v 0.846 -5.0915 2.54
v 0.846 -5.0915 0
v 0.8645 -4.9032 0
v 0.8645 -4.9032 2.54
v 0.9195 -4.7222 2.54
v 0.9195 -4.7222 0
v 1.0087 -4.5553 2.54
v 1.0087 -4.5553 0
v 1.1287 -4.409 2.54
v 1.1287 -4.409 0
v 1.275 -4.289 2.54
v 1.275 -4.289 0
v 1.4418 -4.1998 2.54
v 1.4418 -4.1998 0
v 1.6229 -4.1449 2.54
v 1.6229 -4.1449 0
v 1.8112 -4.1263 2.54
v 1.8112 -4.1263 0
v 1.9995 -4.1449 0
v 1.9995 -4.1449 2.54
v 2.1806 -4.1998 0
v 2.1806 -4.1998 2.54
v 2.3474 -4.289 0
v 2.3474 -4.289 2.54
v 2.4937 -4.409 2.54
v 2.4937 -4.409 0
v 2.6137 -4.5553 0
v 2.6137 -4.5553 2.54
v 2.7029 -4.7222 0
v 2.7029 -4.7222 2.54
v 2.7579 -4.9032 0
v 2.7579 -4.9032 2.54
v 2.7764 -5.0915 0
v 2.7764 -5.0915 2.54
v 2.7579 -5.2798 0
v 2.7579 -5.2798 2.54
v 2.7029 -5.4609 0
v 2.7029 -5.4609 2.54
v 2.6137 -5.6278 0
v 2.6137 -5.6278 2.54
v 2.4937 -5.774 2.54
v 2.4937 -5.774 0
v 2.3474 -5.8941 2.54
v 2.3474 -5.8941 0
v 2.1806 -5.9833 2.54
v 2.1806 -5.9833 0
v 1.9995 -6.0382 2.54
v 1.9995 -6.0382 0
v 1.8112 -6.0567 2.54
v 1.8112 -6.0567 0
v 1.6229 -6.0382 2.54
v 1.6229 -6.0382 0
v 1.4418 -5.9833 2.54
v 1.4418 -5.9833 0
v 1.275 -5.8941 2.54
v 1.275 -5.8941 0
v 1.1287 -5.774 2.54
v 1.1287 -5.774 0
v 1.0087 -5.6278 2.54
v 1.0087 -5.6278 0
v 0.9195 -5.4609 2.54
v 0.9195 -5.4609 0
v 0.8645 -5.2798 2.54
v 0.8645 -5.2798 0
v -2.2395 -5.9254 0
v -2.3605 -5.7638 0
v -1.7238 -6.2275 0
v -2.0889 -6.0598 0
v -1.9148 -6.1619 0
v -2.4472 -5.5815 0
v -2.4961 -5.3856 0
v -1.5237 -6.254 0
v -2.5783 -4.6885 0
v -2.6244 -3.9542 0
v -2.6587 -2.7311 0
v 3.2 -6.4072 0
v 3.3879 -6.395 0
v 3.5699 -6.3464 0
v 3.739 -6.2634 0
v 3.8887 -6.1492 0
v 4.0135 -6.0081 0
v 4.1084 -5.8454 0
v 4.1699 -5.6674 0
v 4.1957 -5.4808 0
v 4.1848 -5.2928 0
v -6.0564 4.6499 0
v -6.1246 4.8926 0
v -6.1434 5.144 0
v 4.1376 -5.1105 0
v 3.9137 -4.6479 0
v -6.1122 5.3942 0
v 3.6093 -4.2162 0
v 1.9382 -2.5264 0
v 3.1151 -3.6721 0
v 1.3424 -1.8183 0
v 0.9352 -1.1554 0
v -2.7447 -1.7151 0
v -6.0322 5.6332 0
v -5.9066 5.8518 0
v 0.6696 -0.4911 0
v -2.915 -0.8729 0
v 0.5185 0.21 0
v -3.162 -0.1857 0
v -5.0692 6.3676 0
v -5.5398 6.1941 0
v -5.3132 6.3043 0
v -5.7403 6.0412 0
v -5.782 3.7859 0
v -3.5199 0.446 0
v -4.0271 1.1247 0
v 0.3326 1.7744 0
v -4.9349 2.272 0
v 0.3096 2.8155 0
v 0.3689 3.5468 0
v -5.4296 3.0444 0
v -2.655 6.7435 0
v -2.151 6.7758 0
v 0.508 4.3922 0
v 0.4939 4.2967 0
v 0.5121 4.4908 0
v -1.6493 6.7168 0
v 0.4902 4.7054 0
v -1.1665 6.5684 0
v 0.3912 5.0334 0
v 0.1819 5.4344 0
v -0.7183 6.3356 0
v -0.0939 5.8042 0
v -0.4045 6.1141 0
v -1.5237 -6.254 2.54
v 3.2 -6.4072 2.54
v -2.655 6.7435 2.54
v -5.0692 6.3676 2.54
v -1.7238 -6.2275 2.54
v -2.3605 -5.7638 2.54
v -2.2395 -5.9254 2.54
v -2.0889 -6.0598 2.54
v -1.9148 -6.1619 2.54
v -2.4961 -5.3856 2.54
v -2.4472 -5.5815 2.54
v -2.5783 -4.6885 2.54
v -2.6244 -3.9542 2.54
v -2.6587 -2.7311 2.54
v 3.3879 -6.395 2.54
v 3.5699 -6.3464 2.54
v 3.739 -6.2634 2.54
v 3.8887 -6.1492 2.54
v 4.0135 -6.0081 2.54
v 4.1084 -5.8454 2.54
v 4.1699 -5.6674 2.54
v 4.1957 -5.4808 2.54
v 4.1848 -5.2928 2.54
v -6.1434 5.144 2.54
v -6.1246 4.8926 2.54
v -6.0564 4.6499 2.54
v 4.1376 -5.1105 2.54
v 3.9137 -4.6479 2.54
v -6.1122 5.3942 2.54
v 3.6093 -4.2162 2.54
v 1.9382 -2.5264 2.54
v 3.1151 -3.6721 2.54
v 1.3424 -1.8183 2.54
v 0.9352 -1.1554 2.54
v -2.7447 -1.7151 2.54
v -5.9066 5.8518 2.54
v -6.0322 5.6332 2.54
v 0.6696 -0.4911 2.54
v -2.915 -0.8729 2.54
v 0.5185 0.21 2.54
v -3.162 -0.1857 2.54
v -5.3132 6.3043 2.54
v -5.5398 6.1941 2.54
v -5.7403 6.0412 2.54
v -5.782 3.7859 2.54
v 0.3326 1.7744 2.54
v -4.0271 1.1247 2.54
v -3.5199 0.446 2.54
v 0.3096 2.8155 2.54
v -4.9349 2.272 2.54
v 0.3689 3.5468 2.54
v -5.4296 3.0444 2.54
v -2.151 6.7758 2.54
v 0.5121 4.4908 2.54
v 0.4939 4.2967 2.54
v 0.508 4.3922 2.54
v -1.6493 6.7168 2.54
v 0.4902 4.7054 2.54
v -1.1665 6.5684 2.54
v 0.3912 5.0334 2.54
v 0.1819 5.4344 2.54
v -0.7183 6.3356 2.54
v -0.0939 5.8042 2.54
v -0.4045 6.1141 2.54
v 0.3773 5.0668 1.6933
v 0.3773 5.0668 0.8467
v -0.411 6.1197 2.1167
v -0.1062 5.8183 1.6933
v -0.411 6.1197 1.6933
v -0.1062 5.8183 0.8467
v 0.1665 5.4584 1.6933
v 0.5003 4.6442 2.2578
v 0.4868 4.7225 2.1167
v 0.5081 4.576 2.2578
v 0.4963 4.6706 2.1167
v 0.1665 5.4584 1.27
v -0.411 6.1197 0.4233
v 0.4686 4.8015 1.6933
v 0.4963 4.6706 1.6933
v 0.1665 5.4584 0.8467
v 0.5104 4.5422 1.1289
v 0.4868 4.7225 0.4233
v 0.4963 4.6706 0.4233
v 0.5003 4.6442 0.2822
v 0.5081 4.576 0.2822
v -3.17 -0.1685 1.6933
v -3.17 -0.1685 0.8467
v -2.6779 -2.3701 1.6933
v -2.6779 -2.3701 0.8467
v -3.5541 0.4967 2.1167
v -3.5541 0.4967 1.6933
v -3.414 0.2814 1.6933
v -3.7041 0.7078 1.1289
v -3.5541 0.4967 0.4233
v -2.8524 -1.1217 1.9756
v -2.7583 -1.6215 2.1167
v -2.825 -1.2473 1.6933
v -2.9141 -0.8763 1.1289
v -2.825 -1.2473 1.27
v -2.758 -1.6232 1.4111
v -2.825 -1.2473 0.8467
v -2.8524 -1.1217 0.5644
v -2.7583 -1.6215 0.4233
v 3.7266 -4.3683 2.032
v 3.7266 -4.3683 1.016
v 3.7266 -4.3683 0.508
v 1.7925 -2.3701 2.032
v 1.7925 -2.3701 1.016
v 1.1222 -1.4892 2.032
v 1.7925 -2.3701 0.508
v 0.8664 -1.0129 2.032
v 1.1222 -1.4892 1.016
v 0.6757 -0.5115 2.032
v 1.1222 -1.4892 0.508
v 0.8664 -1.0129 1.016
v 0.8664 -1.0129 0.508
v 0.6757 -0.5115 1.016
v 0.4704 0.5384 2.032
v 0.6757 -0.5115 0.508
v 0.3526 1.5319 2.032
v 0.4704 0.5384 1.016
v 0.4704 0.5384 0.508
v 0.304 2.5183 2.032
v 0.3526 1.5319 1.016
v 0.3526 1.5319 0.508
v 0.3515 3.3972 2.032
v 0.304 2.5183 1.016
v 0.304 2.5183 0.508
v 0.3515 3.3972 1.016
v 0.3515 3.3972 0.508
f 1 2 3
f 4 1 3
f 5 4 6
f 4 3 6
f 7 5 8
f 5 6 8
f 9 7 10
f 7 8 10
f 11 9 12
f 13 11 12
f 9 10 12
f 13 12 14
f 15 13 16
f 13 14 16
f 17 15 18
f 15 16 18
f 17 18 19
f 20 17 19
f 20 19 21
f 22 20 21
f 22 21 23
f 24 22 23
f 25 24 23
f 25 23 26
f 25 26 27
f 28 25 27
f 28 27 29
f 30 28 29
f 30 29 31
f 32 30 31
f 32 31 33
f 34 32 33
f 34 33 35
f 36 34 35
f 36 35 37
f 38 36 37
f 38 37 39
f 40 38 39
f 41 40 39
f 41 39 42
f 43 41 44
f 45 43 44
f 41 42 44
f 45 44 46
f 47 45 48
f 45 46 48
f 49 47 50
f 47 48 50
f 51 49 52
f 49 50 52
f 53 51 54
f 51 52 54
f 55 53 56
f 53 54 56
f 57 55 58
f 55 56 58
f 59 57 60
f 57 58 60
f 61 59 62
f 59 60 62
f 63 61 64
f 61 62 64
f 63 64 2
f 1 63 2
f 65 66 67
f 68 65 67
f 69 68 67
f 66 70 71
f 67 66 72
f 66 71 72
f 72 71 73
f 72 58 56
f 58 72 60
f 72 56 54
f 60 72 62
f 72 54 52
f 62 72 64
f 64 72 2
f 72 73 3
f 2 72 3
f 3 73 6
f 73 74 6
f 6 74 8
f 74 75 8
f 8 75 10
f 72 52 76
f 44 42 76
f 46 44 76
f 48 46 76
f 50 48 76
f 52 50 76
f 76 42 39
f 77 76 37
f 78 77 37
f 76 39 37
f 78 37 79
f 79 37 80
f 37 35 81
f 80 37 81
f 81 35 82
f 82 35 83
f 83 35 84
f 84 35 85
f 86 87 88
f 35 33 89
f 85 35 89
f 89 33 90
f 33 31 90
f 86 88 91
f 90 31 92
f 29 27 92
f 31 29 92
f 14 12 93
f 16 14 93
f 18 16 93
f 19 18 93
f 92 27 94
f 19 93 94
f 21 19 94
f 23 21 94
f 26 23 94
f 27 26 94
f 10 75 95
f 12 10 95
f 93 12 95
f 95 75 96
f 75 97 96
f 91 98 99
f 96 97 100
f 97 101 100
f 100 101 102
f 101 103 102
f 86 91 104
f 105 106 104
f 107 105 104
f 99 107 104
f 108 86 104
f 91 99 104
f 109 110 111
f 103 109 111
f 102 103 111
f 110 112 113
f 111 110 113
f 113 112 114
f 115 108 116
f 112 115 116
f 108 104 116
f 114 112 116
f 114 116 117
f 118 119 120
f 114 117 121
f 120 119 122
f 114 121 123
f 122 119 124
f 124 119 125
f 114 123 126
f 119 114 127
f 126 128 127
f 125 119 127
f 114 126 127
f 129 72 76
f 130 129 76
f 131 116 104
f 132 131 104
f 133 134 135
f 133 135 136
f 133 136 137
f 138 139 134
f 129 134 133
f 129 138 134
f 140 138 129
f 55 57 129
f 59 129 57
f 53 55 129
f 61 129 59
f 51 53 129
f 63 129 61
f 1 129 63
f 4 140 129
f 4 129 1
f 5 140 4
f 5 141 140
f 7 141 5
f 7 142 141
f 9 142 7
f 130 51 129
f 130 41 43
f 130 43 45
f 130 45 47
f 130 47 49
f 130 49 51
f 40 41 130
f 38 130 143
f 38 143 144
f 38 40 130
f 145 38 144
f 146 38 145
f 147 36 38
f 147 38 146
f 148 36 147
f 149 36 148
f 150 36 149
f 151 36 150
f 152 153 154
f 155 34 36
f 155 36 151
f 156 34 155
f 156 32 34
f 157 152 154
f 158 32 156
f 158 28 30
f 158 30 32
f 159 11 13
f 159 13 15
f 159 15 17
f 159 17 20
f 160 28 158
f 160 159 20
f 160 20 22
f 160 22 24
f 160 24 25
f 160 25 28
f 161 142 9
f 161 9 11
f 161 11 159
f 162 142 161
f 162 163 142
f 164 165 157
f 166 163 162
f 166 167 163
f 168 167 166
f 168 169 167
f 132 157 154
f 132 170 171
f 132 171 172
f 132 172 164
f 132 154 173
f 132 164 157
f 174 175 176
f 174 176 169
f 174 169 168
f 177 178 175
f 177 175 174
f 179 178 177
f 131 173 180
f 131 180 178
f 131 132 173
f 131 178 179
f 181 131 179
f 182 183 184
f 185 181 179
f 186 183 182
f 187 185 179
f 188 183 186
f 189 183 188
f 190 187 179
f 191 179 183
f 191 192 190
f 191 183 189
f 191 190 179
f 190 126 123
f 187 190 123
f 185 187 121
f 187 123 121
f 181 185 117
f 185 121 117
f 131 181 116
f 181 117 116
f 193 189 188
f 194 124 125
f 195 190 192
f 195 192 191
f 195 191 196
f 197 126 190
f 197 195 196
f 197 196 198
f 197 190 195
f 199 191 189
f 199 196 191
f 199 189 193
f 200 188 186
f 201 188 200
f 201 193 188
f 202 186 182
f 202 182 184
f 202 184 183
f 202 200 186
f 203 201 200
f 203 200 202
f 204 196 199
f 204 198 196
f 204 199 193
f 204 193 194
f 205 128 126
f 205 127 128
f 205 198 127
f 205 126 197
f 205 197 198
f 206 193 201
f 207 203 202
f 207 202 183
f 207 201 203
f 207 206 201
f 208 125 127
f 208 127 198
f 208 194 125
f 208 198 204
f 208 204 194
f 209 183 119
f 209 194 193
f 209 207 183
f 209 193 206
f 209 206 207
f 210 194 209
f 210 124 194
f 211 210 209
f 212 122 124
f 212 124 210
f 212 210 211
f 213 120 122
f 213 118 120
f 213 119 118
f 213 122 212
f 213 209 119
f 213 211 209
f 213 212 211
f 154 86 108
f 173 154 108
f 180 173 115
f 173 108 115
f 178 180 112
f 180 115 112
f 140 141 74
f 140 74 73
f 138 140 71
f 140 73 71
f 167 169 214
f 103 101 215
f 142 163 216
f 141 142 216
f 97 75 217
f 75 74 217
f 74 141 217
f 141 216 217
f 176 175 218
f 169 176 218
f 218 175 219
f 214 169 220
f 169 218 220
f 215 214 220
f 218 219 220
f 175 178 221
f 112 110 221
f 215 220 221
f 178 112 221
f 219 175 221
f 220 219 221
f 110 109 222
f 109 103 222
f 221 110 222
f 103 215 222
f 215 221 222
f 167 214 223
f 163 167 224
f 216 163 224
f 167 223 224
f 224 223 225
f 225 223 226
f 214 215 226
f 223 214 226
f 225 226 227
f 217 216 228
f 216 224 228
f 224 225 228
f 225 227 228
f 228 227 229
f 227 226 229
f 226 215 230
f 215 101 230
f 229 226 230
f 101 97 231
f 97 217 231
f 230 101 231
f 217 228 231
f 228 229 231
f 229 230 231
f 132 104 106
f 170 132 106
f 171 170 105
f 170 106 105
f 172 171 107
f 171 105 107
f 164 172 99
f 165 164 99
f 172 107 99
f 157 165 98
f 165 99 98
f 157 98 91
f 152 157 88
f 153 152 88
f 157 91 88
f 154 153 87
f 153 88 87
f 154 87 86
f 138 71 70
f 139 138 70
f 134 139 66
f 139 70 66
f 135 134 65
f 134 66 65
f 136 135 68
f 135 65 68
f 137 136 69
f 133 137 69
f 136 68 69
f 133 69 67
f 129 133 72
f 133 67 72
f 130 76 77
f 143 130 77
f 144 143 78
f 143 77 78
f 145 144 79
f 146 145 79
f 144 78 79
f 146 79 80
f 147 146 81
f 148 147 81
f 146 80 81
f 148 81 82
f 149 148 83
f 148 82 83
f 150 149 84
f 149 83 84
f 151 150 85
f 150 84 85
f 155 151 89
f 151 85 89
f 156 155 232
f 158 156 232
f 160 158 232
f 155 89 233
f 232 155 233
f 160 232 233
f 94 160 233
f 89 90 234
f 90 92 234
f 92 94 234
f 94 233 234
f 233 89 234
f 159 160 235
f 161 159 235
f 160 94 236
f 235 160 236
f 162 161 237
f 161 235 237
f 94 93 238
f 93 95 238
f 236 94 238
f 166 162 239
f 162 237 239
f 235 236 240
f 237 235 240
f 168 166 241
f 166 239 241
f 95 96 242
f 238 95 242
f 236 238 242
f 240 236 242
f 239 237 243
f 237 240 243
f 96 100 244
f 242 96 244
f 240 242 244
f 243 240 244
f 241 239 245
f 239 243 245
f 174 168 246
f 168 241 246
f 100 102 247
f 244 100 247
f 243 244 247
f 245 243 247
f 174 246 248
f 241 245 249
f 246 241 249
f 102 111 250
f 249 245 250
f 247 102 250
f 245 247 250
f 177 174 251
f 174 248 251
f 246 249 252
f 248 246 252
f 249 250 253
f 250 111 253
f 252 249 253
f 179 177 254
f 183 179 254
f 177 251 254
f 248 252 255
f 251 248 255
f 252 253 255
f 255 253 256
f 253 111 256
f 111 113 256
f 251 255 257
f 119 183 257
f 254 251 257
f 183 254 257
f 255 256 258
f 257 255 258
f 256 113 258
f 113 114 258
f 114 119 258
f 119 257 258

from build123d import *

# Parameters (mm, degrees)
BOSS_EXTRUDE1_DEPTH         = 2.54
F_48_0_076_DIAMETER_HOLE1_D = 1.9304


with BuildPart() as part:
    # Sketch1 → Boss-Extrude1 (new body)
    with BuildSketch(Plane.XY):
        with BuildLine():
            Line((-1.523739013, -6.254008737), (3.199990263, -6.407247691))
            ThreePointArc((3.199990263, -6.407247691), (4.013460409, -6.008075165), (4.137562895, -5.110483411))
            add(Edge.make_bspline(
                [(4.137562895, -5.110483411), (3.751708737, -4.057424722), (1.960352922, -2.838406427), (0.682892057, -0.893226264), (0.419560202, 0.841832203), (0.235366214, 2.465138109), (0.366891085, 3.681965276), (0.493851252, 4.296654744)],
                knots=[0, 0, 0, 0, 0.339614963, 0.543785507, 0.644514611, 0.831601299, 1, 1, 1, 1], degree=3))
            add(Edge.make_bspline(
                [(-0.718288865, 6.33558287), (-0.121151201, 6.007229545), (0.640025429, 5.004370625), (0.493851252, 4.296654744)],
                knots=[0, 0, 0, 0, 1, 1, 1, 1], degree=3))
            ThreePointArc((-0.718288865, 6.33558287), (-1.649329968, 6.716784948), (-2.655033, 6.743505128))
            Line((-2.655033, 6.743505128), (-5.069160306, 6.367615902))
            ThreePointArc((-5.069160306, 6.367615902), (-5.974847558, 5.745610239), (-6.05644367, 4.64993578))
            add(Edge.make_bspline(
                [(-6.05644367, 4.64993578), (-5.472575235, 2.247634521), (-3.140324972, 0.9129092), (-2.564431384, -2.647350002), (-2.677357403, -4.146707908), (-2.496094371, -5.385625532)],
                knots=[0, 0, 0, 0, 0.493395358, 0.716015145, 1, 1, 1, 1], degree=3))
            ThreePointArc((-2.496094371, -5.385625532), (-2.167559601, -5.996334743), (-1.523739013, -6.254008737))
        make_face()
    extrude(amount=BOSS_EXTRUDE1_DEPTH)

    # #48 (0.076) Diameter Hole1 (through all)
    with Locations(Plane.XY.offset(2.54)):
        with Locations((1.811202951, -5.091527006)):
            Hole(F_48_0_076_DIAMETER_HOLE1_D / 2)


solid = part.part
